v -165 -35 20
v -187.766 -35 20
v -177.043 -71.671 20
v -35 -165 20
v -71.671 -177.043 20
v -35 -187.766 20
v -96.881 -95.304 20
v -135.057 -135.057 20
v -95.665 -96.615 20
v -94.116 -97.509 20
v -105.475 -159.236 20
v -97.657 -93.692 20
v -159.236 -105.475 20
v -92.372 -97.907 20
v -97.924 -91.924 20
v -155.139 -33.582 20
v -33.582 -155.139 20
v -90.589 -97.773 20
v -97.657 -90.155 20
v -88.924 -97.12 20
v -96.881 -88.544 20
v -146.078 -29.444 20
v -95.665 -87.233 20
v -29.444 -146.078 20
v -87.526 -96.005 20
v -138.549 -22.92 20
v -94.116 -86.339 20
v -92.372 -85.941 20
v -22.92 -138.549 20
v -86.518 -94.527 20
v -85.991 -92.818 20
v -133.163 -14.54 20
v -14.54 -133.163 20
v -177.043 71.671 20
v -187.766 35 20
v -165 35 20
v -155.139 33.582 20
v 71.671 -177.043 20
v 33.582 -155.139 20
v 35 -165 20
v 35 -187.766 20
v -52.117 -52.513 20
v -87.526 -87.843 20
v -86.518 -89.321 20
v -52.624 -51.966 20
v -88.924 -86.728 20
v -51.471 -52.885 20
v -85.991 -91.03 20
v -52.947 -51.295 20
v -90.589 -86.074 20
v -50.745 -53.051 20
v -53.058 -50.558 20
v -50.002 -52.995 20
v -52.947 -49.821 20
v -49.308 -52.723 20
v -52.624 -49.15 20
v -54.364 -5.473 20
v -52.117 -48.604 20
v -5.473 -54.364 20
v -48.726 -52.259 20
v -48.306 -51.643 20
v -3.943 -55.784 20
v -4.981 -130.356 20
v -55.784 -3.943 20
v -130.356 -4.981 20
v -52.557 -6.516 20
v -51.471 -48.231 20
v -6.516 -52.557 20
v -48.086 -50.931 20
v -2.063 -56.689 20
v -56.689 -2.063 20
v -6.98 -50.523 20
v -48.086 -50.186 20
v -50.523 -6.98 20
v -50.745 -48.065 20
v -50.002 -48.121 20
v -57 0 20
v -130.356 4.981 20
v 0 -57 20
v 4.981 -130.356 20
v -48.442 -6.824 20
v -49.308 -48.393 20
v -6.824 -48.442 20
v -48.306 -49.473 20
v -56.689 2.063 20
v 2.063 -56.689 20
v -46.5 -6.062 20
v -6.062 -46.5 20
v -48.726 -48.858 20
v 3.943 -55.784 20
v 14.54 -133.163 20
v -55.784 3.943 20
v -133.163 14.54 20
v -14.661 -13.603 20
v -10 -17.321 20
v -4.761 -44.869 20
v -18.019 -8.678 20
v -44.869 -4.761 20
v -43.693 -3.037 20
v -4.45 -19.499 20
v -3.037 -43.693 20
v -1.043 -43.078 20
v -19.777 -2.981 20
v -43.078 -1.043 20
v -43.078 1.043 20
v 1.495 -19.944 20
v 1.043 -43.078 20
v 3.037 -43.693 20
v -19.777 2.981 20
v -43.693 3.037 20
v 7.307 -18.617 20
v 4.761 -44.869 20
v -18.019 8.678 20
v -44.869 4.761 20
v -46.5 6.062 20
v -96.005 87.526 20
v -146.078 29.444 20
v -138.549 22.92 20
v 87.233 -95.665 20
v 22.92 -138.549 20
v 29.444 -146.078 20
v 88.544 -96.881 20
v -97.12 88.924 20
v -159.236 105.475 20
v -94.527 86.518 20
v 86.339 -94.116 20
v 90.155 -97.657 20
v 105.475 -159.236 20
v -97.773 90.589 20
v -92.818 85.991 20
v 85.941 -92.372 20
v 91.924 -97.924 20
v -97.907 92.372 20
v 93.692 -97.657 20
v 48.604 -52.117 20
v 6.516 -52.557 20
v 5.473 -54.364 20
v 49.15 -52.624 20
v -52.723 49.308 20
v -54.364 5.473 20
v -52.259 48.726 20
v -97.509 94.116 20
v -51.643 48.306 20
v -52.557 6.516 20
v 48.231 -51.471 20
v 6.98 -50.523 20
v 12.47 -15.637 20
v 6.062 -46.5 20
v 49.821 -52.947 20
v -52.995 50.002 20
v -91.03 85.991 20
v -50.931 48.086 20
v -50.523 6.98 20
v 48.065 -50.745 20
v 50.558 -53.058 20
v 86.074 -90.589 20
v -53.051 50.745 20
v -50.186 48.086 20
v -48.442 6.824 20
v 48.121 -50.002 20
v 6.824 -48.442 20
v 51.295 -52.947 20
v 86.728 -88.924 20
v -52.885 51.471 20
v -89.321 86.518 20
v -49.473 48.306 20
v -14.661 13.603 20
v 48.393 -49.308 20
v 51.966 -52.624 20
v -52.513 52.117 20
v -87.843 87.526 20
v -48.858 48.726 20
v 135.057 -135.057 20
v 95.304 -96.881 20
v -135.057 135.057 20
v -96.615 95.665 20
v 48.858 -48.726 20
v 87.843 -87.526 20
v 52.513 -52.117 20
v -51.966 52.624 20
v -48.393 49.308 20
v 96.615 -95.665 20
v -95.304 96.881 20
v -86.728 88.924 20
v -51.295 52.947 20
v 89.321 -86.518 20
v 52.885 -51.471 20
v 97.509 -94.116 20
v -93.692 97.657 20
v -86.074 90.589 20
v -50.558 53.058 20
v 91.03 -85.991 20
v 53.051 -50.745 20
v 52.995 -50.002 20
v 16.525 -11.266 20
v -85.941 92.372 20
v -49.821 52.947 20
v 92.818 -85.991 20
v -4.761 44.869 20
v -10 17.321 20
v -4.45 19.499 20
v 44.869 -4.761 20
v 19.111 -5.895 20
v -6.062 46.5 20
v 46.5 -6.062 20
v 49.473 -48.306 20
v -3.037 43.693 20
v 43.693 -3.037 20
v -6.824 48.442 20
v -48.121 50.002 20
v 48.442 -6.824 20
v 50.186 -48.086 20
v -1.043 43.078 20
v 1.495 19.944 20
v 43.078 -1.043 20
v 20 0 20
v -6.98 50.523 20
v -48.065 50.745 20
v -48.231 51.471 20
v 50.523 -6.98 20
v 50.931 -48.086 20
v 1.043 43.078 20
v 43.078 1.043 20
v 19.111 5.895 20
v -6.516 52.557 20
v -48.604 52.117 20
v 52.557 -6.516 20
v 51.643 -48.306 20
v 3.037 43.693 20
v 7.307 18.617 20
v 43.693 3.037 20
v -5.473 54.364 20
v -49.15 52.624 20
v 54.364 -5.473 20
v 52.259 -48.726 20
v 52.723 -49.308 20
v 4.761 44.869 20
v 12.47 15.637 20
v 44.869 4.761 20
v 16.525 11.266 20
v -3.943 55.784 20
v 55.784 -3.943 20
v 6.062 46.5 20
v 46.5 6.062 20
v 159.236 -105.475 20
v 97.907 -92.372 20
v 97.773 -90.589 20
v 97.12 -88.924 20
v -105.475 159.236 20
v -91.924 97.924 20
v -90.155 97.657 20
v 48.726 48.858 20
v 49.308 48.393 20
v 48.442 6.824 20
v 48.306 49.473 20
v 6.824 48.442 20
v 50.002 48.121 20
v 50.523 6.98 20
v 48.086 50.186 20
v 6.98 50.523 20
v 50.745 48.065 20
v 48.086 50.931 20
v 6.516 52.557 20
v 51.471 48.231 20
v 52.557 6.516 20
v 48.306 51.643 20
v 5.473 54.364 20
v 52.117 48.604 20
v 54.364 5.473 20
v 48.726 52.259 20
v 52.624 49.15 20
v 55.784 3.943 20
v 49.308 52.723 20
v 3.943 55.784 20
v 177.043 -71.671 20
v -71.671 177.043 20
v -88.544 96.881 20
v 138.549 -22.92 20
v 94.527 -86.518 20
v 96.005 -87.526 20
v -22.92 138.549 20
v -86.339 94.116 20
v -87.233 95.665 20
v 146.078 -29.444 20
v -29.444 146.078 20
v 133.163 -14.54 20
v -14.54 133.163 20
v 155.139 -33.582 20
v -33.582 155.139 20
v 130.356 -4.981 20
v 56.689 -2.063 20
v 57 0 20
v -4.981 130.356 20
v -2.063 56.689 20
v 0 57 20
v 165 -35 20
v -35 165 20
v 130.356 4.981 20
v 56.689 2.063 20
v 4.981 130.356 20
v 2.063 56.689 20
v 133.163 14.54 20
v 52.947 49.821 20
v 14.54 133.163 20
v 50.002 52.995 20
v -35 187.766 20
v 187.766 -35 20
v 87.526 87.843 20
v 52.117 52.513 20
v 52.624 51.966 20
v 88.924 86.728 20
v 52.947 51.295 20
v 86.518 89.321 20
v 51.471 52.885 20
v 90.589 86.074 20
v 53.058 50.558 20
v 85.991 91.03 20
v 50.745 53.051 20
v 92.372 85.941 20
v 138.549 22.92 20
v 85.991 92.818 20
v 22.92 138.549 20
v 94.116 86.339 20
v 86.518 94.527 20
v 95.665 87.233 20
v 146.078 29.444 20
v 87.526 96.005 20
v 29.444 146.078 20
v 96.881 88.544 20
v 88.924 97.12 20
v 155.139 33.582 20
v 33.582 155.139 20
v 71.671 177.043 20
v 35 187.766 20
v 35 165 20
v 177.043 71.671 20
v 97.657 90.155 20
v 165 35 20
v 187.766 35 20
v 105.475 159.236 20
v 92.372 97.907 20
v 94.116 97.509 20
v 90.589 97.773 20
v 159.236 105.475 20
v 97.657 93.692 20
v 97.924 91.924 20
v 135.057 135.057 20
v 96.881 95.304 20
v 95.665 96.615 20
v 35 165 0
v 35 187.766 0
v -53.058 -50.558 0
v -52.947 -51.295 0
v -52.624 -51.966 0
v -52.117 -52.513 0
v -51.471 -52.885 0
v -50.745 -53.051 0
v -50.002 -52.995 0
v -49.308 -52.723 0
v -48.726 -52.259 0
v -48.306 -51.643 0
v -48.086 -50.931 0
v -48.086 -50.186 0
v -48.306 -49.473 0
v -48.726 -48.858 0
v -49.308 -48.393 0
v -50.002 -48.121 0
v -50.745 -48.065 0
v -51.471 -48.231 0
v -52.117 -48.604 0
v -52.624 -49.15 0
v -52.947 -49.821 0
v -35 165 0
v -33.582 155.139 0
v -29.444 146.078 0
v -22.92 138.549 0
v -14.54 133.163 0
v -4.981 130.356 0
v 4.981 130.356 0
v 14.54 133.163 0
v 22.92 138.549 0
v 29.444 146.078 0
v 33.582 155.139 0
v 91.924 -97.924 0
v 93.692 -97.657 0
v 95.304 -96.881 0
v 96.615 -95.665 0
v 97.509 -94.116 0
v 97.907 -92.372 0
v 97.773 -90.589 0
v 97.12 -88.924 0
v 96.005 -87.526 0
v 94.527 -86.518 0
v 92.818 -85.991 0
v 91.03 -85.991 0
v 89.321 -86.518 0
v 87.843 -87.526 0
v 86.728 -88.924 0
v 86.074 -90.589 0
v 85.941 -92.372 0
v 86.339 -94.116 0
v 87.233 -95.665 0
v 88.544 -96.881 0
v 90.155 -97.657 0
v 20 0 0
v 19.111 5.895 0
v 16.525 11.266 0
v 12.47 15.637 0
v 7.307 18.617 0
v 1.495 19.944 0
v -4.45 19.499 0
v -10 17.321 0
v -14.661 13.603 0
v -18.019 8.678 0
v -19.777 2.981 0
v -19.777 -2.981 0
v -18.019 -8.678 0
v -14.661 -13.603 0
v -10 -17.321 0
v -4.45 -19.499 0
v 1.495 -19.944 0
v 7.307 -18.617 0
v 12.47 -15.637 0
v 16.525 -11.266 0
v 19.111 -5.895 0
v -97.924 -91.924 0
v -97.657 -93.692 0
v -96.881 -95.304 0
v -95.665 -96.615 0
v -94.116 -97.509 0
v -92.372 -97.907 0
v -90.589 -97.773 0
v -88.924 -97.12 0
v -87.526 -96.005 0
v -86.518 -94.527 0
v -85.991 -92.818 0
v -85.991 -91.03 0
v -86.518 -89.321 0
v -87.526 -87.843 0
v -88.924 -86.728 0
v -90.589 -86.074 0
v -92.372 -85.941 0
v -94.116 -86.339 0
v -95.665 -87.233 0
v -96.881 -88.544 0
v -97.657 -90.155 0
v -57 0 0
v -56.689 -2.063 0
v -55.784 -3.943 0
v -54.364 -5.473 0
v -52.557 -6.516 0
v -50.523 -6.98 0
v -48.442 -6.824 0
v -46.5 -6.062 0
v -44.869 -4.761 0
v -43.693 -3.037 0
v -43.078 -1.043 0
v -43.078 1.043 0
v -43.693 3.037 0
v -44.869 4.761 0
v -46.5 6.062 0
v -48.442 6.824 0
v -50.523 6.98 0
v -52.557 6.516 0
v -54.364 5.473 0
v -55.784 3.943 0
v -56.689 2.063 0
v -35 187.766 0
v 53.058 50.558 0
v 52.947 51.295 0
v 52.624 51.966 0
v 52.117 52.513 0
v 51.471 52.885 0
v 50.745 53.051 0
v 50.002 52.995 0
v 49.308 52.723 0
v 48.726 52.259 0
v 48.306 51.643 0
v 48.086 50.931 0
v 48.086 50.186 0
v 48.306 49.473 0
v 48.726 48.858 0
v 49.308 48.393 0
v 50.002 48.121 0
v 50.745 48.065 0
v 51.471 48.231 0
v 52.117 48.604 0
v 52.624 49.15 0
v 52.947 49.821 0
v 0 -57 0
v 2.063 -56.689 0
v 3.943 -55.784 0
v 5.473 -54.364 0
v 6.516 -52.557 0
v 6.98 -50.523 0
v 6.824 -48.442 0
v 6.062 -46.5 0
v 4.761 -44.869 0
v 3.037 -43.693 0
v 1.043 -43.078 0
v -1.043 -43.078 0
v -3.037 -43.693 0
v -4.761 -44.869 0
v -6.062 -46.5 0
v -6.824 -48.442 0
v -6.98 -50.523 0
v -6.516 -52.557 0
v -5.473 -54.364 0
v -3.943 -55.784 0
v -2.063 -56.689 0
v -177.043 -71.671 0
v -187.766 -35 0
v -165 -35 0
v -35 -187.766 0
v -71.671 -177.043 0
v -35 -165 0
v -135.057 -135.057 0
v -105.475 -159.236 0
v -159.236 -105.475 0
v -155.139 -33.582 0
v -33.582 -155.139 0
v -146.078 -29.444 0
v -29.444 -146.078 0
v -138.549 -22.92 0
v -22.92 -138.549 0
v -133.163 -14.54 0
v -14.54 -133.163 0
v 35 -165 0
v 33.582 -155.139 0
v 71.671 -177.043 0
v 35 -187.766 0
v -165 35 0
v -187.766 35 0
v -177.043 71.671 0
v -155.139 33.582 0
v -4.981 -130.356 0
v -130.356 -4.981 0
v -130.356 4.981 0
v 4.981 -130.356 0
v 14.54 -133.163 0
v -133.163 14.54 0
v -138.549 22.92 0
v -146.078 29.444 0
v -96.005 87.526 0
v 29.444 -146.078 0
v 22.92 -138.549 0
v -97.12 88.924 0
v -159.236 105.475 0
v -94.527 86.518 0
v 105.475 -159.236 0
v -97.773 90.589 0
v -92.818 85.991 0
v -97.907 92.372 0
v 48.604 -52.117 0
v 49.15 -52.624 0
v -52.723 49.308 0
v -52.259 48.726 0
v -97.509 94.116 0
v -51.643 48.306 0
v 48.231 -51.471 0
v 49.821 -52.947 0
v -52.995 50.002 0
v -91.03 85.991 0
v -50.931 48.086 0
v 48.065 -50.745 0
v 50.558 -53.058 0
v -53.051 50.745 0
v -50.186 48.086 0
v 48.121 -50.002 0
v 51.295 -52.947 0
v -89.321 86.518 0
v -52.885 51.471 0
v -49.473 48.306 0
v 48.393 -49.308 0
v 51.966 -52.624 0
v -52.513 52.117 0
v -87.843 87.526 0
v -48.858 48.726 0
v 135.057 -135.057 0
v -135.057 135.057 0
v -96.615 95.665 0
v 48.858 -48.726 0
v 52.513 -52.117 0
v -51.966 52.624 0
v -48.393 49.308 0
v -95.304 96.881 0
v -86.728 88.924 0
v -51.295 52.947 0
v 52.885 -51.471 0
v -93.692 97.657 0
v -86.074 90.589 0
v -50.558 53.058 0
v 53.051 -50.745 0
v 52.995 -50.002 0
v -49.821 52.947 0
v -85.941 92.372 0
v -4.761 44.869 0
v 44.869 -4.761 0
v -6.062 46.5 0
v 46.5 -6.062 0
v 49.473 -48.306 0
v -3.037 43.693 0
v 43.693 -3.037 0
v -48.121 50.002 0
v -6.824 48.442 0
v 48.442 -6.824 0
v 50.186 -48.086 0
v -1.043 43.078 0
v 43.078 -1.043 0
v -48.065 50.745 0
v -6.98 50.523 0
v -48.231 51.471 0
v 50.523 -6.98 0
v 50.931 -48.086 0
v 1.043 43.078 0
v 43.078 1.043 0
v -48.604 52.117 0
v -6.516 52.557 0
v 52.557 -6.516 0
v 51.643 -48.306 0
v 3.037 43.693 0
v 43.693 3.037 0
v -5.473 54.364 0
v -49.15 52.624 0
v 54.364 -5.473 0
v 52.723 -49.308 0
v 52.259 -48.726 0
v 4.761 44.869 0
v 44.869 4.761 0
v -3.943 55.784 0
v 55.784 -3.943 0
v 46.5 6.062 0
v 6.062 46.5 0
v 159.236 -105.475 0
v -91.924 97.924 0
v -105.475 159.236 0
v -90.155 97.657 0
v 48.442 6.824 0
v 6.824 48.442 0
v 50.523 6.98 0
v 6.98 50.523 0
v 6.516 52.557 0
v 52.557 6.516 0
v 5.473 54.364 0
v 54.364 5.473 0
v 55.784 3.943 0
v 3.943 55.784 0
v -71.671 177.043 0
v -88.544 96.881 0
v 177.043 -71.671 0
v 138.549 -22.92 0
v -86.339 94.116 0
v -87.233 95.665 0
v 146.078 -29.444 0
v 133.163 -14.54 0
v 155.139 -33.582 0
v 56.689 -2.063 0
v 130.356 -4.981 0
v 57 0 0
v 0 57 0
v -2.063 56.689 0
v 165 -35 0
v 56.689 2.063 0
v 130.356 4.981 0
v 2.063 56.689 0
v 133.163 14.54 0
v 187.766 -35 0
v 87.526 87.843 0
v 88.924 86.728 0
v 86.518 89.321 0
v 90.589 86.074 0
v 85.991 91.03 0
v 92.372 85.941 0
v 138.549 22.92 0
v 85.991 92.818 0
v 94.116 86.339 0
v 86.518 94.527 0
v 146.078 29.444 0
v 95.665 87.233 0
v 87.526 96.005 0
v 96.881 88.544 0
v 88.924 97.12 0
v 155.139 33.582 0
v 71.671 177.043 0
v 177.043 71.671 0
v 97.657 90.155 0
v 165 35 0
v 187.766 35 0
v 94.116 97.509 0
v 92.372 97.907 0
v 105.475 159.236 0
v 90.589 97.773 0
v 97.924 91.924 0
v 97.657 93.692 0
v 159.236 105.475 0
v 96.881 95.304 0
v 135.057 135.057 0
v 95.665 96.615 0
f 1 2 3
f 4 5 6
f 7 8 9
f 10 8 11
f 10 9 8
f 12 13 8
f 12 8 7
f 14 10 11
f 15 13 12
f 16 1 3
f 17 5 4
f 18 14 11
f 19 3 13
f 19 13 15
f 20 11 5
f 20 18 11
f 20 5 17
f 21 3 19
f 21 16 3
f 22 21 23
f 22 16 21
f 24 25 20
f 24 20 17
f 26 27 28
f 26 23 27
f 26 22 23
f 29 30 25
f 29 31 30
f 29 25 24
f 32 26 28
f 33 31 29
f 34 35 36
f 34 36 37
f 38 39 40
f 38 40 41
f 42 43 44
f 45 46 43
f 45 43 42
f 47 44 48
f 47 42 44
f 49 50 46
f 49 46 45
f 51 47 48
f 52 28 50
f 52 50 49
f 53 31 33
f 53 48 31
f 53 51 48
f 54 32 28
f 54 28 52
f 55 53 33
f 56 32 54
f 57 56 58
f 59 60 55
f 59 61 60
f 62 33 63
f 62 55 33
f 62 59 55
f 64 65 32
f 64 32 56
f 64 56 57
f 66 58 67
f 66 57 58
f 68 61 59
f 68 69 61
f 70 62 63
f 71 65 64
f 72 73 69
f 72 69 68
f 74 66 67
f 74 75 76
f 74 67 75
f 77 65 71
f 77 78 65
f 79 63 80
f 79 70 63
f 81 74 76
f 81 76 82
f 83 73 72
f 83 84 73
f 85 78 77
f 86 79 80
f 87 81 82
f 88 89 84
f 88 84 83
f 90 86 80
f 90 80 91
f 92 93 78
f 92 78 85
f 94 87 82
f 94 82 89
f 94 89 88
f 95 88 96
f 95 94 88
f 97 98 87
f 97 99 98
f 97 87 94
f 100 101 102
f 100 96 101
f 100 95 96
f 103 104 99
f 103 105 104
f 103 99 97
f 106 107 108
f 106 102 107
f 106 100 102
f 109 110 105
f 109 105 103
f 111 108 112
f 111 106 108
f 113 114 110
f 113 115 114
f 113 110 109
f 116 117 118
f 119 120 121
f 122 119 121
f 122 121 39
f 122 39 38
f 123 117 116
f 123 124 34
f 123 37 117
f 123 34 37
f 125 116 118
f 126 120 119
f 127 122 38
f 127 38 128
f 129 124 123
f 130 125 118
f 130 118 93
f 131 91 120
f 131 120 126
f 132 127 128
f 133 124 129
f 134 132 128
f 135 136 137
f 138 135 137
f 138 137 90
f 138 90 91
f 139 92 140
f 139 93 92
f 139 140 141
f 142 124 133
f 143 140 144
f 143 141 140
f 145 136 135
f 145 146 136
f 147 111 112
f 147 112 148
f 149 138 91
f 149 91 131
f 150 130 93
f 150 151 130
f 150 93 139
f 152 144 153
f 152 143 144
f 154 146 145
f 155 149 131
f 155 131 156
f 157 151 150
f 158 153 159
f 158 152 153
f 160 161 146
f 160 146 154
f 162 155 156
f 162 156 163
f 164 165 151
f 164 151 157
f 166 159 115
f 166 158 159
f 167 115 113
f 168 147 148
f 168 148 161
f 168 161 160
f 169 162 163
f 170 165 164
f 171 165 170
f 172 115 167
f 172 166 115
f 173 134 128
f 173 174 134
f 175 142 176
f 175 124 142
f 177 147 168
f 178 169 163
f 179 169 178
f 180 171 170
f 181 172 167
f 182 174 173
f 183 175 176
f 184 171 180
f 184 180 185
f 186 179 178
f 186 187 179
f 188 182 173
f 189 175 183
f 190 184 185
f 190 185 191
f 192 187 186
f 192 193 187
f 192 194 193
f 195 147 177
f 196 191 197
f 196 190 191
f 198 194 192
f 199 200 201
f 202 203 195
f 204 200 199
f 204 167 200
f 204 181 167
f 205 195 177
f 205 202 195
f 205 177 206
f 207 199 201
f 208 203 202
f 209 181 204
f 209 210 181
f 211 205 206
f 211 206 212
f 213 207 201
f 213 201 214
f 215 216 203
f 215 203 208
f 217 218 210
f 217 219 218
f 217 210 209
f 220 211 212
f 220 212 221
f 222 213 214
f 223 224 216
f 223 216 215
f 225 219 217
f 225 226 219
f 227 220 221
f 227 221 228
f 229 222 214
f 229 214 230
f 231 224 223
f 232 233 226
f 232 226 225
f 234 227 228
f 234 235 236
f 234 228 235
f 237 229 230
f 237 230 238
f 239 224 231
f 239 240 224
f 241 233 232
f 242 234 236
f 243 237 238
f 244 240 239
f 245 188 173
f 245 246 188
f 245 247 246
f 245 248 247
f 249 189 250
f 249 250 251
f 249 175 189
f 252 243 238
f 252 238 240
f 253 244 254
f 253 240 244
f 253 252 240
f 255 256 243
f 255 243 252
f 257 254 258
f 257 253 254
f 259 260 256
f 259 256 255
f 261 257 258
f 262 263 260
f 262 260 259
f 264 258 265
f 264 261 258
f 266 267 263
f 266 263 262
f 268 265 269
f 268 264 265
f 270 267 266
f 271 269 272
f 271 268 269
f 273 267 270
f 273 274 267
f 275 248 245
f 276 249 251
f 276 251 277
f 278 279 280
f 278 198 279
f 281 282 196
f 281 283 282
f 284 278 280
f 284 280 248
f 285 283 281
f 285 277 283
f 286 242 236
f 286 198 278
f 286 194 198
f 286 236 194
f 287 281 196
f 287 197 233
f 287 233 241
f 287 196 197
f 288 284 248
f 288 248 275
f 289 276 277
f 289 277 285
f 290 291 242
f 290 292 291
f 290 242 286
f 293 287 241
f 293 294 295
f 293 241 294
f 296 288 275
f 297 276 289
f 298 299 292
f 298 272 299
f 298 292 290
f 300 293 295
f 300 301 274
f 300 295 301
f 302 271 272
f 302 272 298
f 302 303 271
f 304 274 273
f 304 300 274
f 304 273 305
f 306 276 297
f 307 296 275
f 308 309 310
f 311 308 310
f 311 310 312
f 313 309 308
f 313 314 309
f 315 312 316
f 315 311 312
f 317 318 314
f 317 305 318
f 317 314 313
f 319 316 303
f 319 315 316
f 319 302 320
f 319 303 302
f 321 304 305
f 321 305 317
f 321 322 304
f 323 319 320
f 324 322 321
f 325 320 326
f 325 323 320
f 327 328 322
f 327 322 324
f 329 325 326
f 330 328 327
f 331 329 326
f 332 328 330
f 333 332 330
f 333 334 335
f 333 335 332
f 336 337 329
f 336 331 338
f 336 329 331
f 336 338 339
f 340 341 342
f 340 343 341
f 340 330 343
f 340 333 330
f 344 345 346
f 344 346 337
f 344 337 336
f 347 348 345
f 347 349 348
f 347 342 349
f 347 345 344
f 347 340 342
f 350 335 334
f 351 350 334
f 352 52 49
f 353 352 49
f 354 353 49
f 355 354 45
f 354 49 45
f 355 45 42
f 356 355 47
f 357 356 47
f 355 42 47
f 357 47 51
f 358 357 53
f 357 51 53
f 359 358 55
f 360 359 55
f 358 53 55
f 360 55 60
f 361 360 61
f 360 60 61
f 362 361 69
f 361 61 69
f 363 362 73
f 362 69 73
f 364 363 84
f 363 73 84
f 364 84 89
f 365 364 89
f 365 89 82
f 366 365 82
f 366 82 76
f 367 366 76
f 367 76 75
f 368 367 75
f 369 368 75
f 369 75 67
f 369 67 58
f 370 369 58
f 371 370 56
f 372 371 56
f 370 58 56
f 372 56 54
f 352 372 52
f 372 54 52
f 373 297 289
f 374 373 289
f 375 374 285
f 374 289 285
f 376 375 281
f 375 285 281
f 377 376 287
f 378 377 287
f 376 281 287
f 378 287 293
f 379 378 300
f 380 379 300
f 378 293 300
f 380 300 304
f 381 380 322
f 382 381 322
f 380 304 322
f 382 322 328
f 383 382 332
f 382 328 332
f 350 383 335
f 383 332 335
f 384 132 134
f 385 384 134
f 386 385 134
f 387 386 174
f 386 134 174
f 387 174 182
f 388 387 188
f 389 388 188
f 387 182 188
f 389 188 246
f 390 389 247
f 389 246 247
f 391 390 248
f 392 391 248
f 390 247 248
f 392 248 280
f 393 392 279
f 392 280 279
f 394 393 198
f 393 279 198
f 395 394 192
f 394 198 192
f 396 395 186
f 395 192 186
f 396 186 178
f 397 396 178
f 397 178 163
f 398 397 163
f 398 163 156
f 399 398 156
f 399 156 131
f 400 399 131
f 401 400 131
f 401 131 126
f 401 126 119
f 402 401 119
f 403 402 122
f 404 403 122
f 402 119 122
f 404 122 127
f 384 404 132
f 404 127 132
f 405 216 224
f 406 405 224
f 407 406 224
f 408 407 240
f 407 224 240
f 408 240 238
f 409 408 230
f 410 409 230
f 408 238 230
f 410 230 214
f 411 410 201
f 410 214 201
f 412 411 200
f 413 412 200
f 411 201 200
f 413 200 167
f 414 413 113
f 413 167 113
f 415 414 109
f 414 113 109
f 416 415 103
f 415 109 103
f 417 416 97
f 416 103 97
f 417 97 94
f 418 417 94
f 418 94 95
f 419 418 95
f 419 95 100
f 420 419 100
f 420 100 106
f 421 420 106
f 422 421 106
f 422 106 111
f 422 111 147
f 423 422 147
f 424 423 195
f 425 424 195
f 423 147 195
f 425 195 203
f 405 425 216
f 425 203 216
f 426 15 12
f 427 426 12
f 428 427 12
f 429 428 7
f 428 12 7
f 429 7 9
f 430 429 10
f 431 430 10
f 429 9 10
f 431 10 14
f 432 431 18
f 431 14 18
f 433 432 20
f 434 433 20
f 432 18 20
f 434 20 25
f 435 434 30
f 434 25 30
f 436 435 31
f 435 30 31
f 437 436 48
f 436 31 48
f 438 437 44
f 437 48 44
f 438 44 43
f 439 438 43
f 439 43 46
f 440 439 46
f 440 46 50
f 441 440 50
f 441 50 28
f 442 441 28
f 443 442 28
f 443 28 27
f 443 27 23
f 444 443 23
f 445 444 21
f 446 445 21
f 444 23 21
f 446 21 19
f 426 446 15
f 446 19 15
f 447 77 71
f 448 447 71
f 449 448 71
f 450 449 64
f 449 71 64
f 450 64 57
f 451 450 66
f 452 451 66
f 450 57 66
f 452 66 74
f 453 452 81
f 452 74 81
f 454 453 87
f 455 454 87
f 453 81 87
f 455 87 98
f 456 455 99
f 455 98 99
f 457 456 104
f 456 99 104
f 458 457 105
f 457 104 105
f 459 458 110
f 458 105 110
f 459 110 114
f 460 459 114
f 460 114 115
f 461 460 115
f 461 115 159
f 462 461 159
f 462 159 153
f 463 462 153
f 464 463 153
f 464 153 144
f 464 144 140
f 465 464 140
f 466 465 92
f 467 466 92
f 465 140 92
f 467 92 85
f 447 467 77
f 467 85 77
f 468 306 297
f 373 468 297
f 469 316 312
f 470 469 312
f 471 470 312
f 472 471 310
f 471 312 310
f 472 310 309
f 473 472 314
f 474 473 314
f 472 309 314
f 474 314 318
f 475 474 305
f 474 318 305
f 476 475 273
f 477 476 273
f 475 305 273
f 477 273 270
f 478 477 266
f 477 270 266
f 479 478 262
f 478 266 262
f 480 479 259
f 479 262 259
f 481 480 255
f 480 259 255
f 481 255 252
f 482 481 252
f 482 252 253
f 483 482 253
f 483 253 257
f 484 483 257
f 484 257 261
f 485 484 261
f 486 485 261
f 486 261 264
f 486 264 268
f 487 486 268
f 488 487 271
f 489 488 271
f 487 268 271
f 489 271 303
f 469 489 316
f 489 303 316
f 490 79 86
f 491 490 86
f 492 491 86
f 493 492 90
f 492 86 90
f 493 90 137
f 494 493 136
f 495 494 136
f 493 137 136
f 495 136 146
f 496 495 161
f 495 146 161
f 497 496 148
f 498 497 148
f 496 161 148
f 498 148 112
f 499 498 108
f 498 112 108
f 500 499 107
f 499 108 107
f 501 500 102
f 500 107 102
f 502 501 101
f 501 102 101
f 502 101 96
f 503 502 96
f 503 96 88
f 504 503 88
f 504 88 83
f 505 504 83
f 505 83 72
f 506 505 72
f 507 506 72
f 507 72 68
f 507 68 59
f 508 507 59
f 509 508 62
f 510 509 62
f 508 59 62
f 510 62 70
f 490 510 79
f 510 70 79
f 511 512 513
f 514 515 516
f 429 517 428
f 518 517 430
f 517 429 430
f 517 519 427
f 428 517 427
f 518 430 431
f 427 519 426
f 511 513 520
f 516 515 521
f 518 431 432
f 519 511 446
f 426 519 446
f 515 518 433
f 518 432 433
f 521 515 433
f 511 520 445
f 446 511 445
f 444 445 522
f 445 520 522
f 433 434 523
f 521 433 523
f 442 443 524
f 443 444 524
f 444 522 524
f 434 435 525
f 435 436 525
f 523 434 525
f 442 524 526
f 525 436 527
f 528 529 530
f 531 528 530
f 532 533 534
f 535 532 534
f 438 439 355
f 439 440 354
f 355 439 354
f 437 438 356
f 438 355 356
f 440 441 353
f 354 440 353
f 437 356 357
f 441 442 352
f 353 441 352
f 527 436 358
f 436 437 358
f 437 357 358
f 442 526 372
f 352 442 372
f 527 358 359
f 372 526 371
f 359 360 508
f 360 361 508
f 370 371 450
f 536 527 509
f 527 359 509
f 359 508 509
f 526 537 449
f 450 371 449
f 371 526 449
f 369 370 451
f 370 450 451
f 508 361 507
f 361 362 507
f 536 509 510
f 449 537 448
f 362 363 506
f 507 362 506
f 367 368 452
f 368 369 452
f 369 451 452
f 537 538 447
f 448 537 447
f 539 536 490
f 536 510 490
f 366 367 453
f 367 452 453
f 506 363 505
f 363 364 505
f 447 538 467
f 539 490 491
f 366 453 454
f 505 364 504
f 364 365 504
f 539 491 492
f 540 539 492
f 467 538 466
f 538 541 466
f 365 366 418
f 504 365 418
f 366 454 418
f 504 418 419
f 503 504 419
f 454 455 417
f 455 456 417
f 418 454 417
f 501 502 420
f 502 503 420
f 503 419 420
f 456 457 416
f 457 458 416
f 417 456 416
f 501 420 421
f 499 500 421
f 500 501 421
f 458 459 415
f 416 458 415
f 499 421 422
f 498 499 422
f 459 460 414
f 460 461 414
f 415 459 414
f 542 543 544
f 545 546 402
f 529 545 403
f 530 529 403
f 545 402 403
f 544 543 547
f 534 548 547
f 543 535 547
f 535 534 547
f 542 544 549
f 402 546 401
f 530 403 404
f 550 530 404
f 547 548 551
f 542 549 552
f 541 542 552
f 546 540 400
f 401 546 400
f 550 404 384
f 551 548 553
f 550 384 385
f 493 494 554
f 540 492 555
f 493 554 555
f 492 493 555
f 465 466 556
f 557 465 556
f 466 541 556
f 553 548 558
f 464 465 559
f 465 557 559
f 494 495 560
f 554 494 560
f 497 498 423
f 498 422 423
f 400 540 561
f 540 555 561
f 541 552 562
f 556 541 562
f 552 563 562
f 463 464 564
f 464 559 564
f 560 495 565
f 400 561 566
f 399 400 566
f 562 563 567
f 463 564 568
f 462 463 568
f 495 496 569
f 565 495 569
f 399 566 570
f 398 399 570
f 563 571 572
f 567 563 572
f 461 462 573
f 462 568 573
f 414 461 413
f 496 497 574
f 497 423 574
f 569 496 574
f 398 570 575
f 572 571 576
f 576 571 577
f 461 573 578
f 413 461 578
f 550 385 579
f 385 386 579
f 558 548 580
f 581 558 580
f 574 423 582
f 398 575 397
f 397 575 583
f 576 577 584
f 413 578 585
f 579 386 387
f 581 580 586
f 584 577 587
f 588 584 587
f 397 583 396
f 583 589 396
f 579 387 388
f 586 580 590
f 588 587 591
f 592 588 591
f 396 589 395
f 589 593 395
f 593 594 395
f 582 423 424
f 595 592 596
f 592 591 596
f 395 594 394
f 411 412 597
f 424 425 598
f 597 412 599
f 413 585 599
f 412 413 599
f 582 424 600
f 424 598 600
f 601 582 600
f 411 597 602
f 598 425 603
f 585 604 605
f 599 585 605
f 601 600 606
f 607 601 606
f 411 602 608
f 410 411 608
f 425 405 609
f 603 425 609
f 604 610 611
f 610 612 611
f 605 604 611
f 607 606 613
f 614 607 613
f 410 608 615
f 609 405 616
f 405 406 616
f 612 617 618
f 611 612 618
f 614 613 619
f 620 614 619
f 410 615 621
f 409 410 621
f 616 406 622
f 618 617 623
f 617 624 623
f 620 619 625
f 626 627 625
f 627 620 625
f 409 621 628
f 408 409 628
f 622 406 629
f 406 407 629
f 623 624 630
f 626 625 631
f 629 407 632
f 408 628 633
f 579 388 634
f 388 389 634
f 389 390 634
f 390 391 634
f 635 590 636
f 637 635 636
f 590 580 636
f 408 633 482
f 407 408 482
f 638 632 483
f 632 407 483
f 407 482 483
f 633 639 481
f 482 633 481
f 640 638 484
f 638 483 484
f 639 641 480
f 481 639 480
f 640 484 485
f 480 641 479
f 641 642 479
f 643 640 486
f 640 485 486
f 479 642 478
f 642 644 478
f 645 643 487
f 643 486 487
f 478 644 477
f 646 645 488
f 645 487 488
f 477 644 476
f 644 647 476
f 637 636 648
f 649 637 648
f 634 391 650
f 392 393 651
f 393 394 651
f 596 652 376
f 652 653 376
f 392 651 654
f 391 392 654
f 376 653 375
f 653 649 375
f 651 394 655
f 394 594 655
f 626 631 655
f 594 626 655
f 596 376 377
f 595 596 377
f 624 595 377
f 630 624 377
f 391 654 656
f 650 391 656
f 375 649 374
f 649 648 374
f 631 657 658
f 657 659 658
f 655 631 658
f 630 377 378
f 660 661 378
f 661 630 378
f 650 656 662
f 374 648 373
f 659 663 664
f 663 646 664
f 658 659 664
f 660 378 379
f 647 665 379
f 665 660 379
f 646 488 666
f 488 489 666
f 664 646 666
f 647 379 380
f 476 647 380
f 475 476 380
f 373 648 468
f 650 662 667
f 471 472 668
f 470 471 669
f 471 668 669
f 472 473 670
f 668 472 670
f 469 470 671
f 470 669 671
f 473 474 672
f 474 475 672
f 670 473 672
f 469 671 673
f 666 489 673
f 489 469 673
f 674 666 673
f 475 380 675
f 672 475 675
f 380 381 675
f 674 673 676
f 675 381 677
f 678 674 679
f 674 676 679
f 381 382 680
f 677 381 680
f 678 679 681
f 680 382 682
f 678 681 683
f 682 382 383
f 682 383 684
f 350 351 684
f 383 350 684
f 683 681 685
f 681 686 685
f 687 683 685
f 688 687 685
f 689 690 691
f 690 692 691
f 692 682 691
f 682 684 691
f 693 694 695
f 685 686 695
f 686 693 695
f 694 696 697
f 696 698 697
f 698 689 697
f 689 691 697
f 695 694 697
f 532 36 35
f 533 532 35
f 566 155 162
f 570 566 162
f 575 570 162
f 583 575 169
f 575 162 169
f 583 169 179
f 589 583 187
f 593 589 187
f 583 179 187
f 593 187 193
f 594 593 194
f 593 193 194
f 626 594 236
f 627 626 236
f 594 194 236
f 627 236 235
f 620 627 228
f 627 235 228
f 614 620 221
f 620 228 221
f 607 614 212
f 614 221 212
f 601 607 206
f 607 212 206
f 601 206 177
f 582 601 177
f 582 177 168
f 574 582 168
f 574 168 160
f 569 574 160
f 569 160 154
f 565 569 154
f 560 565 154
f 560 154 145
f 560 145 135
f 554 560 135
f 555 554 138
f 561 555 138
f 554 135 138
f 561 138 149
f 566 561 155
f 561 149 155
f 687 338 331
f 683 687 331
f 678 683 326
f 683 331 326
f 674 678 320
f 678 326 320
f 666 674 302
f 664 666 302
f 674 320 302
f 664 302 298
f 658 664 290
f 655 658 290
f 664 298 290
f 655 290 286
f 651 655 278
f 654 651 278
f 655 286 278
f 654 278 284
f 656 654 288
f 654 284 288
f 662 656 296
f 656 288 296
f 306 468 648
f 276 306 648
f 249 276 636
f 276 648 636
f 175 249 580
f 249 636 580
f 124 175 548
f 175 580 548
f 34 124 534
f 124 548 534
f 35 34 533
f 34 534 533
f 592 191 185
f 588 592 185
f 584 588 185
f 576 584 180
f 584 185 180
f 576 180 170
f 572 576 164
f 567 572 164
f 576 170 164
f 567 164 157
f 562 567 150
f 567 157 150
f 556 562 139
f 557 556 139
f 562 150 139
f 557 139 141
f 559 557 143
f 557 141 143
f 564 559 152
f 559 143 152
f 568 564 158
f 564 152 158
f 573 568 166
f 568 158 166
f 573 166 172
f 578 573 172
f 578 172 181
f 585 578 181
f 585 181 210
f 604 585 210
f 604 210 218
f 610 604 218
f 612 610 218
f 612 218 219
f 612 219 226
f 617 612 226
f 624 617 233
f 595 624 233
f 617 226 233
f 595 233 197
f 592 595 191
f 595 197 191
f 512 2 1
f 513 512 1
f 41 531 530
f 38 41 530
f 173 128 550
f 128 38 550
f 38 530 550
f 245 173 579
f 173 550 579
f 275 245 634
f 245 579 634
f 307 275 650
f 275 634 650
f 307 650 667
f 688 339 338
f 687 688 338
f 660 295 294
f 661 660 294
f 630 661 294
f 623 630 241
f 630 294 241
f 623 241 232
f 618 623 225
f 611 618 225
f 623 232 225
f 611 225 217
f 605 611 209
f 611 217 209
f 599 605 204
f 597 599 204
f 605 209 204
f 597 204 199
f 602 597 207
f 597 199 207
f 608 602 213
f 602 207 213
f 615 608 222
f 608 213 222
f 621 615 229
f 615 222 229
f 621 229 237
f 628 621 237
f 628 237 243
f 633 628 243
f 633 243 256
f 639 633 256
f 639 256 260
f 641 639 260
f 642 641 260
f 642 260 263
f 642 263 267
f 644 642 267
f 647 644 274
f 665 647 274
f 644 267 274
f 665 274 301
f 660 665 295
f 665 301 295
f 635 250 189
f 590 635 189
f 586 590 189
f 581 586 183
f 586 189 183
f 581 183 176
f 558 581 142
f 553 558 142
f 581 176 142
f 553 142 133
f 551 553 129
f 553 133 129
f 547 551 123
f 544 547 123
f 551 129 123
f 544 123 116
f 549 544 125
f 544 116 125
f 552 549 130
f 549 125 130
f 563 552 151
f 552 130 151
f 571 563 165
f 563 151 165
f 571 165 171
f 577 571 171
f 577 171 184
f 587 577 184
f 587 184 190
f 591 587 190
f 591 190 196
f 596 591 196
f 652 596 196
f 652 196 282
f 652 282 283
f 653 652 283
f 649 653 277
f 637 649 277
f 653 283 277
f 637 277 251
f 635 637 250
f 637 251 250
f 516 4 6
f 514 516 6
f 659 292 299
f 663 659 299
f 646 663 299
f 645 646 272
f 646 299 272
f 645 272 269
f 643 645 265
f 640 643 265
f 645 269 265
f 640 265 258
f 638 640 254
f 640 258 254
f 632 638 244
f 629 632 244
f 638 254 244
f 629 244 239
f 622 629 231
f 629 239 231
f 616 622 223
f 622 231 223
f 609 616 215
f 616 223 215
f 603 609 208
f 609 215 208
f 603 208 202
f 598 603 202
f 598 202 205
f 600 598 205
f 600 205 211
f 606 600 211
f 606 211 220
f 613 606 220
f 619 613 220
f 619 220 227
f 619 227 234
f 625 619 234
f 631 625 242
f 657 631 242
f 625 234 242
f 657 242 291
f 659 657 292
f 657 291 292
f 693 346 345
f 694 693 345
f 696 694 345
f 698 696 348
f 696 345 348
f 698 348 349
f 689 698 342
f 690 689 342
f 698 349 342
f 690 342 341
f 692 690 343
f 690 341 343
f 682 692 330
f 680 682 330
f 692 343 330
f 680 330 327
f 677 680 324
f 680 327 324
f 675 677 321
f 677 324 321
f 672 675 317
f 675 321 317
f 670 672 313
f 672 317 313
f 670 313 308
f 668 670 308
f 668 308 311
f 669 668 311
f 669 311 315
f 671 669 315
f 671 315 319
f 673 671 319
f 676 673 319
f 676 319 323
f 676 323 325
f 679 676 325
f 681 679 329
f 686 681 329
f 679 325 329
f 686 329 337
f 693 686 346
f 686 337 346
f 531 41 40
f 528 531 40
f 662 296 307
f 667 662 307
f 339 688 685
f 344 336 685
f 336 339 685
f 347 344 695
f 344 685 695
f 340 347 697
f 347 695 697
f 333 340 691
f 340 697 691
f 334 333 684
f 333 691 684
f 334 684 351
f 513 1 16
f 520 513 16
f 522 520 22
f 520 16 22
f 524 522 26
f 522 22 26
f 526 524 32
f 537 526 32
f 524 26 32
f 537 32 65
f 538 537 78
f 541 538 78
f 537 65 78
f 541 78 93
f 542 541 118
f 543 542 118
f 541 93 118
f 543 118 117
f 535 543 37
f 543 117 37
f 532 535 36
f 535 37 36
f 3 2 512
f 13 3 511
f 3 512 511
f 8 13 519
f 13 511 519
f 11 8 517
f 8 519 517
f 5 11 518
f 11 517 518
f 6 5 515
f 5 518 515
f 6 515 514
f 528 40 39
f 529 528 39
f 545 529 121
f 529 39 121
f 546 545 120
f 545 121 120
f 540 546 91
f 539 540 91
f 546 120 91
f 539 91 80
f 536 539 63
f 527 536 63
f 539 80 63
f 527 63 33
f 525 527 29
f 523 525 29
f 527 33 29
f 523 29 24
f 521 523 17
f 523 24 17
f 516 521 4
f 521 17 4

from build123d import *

# Parameters (mm, degrees)
ESQUISSE1_R                  = 191
BASE_EXTRUSION_DEPTH         = 20
ESQUISSE2_R                  = 20
ENL_V_MAT_EXTRU_1_DEPTH      = 20
ESQUISSE3_R                  = 7
ENL_V_MAT_EXTRU_2_DEPTH      = 20
R_P_TITION_CIRCULAIRE1_COUNT = 4
ESQUISSE4_R                  = 6
ESQUISSE4_R_2                = 2.5
ENL_V_MAT_EXTRU_3_DEPTH      = 20
R_P_TITION_CIRCULAIRE2_COUNT = 4
ENL_V_MAT_EXTRU_4_DEPTH      = 271.854204324
R_P_TITION_CIRCULAIRE3_COUNT = 4


with BuildPart() as part:
    # Esquisse1 → Base-Extrusion (new body)
    with BuildSketch(Plane.XY):
        Circle(ESQUISSE1_R)
    extrude(amount=BASE_EXTRUSION_DEPTH)

    # Esquisse2 → Enlèv. mat.-Extru.1 (cut)
    with BuildSketch(Plane.XY.offset(20)):
        Circle(ESQUISSE2_R)
    extrude(amount=-ENL_V_MAT_EXTRU_1_DEPTH, mode=Mode.SUBTRACT)

    # Esquisse3 → Enlèv. mat.-Extru.2 (cut)
    with BuildSketch(Plane.XY.offset(20)):
        with Locations((50, 0)):
            Circle(ESQUISSE3_R)
    enl_v_mat_extru_2 = extrude(amount=-ENL_V_MAT_EXTRU_2_DEPTH, mode=Mode.SUBTRACT)

    # Répétition circulaire1: Enlèv. mat.-Extru.2 ×4 about axis
    r_p_tition_circulaire1_axis = Axis((0, 0, 0), (0, 0, -1))
    for i in range(1, R_P_TITION_CIRCULAIRE1_COUNT):
        add(enl_v_mat_extru_2.rotate(r_p_tition_circulaire1_axis, i * 360 / R_P_TITION_CIRCULAIRE1_COUNT), mode=Mode.SUBTRACT)

    # Esquisse4 → Enlèv. mat.-Extru.3 (cut)
    with BuildSketch(Plane.XY.offset(20)):
        with Locations((91.923881554, 91.923881554)):
            Circle(ESQUISSE4_R)
        with Locations((50.558134855, 50.558134855)):
            Circle(ESQUISSE4_R_2)
    enl_v_mat_extru_3 = extrude(amount=-ENL_V_MAT_EXTRU_3_DEPTH, mode=Mode.SUBTRACT)

    # Répétition circulaire2: Enlèv. mat.-Extru.3 ×4 about axis
    r_p_tition_circulaire2_axis = Axis((0, 0, 0), (0, 0, -1))
    for i in range(1, R_P_TITION_CIRCULAIRE2_COUNT):
        add(enl_v_mat_extru_3.rotate(r_p_tition_circulaire2_axis, i * 360 / R_P_TITION_CIRCULAIRE2_COUNT), mode=Mode.SUBTRACT)

    # Esquisse5 → Enlèv. mat.-Extru.4 (cut, through all)
    with BuildSketch(Plane.XY.offset(20)):
        with BuildLine():
            Line((-35, 187.765811585), (-35, 165))
            ThreePointArc((-35, 165), (0, 130), (35, 165))
            Line((35, 165), (35, 187.765811585))
            ThreePointArc((35, 187.765811585), (0, 191), (-35, 187.765811585))
        make_face()
    enl_v_mat_extru_4 = extrude(amount=-ENL_V_MAT_EXTRU_4_DEPTH, mode=Mode.SUBTRACT)

    # Répétition circulaire3: Enlèv. mat.-Extru.4 ×4 about axis
    r_p_tition_circulaire3_axis = Axis((0, 0, 0), (0, 0, -1))
    for i in range(1, R_P_TITION_CIRCULAIRE3_COUNT):
        add(enl_v_mat_extru_4.rotate(r_p_tition_circulaire3_axis, i * 360 / R_P_TITION_CIRCULAIRE3_COUNT), mode=Mode.SUBTRACT)


solid = part.part
